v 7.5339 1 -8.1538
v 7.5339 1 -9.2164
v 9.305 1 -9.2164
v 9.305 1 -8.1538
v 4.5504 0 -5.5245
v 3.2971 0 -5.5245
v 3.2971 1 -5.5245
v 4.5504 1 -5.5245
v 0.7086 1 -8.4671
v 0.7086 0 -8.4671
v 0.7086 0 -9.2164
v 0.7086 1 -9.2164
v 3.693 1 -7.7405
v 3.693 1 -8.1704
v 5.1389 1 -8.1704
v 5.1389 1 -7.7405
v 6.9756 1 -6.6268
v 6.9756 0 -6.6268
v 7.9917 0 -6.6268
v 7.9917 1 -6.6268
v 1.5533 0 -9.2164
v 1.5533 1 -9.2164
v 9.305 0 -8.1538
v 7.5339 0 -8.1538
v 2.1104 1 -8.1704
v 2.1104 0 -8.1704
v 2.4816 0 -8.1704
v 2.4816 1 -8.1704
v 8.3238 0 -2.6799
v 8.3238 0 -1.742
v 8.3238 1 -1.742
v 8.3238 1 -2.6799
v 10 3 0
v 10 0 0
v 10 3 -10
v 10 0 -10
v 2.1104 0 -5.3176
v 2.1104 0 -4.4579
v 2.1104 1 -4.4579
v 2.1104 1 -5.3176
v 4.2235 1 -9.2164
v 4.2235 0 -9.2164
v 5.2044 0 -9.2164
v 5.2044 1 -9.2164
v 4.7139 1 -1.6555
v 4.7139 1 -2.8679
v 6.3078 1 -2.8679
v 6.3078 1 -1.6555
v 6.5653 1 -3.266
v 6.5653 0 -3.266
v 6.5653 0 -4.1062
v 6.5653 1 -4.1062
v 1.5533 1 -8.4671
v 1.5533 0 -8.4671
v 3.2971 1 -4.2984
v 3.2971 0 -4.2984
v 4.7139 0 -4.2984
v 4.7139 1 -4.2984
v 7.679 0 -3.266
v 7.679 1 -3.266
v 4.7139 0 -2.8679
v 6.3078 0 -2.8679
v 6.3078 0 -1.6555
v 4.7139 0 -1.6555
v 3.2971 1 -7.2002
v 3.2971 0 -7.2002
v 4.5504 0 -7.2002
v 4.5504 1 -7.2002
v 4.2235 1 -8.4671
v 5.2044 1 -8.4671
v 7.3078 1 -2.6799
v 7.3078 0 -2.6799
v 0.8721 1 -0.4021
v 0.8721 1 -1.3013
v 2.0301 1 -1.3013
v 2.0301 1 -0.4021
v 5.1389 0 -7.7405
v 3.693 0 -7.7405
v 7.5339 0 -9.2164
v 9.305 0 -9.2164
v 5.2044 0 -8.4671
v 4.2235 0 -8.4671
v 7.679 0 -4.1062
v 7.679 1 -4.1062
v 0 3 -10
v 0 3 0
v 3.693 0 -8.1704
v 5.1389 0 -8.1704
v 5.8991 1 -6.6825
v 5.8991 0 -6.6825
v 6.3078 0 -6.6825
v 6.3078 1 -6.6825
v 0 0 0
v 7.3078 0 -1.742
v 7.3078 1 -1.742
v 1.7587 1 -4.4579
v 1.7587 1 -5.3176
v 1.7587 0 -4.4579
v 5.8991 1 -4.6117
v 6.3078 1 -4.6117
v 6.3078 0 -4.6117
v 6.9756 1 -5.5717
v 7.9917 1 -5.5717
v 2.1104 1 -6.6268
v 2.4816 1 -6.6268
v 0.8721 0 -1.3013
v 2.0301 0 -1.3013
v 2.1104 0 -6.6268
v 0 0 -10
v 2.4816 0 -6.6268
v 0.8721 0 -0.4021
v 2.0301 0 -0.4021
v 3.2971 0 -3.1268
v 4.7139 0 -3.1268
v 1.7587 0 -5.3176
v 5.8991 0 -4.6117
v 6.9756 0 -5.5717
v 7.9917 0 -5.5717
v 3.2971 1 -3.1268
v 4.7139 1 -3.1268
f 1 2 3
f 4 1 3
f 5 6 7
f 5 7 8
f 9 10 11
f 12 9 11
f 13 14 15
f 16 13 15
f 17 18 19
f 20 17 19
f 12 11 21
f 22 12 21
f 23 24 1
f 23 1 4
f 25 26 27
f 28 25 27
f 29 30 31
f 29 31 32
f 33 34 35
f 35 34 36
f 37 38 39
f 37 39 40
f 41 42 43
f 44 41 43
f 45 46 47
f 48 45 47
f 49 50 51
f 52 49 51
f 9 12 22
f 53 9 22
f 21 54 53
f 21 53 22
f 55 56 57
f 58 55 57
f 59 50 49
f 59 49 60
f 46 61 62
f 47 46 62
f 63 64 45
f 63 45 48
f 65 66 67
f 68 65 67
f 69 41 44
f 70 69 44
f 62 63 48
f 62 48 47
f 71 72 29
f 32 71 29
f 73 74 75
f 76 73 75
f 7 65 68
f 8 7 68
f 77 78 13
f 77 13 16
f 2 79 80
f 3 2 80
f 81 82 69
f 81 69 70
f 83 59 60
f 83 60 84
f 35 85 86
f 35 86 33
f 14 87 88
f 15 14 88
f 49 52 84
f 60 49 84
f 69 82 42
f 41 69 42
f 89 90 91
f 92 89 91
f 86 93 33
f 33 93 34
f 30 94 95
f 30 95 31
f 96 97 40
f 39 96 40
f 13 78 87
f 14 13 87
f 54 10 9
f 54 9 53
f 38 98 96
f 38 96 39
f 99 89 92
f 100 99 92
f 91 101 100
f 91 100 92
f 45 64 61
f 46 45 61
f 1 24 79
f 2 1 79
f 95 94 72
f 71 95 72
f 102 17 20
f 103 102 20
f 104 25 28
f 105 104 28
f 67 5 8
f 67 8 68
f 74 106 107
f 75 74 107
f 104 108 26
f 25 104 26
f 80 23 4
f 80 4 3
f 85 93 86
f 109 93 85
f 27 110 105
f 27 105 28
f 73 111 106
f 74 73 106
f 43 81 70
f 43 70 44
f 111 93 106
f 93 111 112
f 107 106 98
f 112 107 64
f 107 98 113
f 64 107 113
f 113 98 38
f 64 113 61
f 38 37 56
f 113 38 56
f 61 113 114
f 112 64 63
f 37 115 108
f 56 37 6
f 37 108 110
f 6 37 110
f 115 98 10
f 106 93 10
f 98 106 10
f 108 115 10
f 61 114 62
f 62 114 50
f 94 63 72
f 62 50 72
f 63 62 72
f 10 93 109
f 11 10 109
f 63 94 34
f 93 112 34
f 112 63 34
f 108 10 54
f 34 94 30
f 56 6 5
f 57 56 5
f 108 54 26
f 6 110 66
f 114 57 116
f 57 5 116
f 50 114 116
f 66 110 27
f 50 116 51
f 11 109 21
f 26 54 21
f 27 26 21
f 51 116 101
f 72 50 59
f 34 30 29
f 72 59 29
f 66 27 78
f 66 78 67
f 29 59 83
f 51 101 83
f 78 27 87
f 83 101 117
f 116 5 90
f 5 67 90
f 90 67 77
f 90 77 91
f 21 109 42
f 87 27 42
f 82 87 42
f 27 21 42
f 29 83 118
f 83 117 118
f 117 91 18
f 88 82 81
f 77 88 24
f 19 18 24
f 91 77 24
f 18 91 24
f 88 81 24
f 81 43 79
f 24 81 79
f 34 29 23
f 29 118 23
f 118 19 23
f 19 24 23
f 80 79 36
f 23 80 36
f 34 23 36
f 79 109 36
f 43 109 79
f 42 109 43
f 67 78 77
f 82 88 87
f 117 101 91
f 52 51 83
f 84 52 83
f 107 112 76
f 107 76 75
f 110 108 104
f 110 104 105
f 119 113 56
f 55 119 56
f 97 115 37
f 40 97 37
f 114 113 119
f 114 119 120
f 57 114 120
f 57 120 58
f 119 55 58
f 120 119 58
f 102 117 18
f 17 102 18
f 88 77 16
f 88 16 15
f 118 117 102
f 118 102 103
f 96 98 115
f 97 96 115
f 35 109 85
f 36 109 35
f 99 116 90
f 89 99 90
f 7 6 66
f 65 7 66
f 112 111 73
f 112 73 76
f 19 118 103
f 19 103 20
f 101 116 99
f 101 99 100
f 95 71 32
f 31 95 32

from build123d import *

# Parameters (mm, degrees)
SKETCH_1_W          = 10
SKETCH_1_H          = 10
EXTRUDE_1_DEPTH     = 3
SKETCH_2_W          = 0.84464817
SKETCH_2_H          = 0.749284667
SKETCH_2_W_2        = 0.980881746
SKETCH_2_W_3        = 1.157985395
SKETCH_2_H_2        = 0.899141601
SKETCH_2_W_4        = 1.771036487
SKETCH_2_H_3        = 1.062621892
SKETCH_2_W_5        = 1.253348898
SKETCH_2_H_4        = 1.675672983
SKETCH_2_W_6        = 0.408700727
SKETCH_2_H_5        = 2.070750353
SKETCH_2_W_7        = 1.416829189
SKETCH_2_H_6        = 1.171608752
SKETCH_2_W_8        = 1.593932837
SKETCH_2_H_7        = 1.212478826
CUT_EXTRUDE_1_DEPTH = 1
SKETCH_3_W          = 0.351704959
SKETCH_3_H          = 0.859723233
SKETCH_3_W_2        = 0.371244123
SKETCH_3_H_2        = 1.543593986
SKETCH_3_W_3        = 1.445898165
SKETCH_3_H_3        = 0.429861616
SKETCH_3_W_4        = 1.016036548
SKETCH_3_H_4        = 1.055114877
SKETCH_3_W_5        = 1.11373237
SKETCH_3_H_5        = 0.840184069
SKETCH_3_H_6        = 0.937879891
CUT_EXTRUDE_3_DEPTH = 1


with BuildPart() as part:
    # 草图1 → 凸台-拉伸1 (new body)
    with BuildSketch(Plane(origin=(0, 0, 0), x_dir=(1, 0, 0), z_dir=(0, 1, 0))):
        with Locations((5, 5)):
            Rectangle(SKETCH_1_W, SKETCH_1_H)
    extrude(amount=EXTRUDE_1_DEPTH)

    # 草图2 → 切除-拉伸1 (cut)
    with BuildSketch(Plane(origin=(0, 0, 0), x_dir=(1, 0, 0), z_dir=(0, 1, 0))):
        with Locations((1.130966445, 8.841786839)):
            Rectangle(SKETCH_2_W, SKETCH_2_H)
        with Locations((4.713909491, 8.841786839)):
            Rectangle(SKETCH_2_W_2, SKETCH_2_H)
        with Locations((1.451115349, 0.851687615)):
            Rectangle(SKETCH_2_W_3, SKETCH_2_H_2)
        with Locations((8.419462755, 8.685118227)):
            Rectangle(SKETCH_2_W_4, SKETCH_2_H_3)
        with Locations((3.923754751, 6.362335759)):
            Rectangle(SKETCH_2_W_5, SKETCH_2_H_4)
        with Locations((6.103491964, 5.647109485)):
            Rectangle(SKETCH_2_W_6, SKETCH_2_H_5)
        with Locations((4.005494897, 3.712592708)):
            Rectangle(SKETCH_2_W_7, SKETCH_2_H_6)
        with Locations((5.51087591, 2.261705125)):
            Rectangle(SKETCH_2_W_8, SKETCH_2_H_7)
    extrude(amount=CUT_EXTRUDE_1_DEPTH, mode=Mode.SUBTRACT)

    # 草图3 → 切除-拉伸3 (cut)
    with BuildSketch(Plane(origin=(0, 0, 0), x_dir=(1, 0, 0), z_dir=(0, 1, 0))):
        with Locations((1.934516979, 4.887785167)):
            Rectangle(SKETCH_3_W, SKETCH_3_H)
        with Locations((2.29599152, 7.39856779)):
            Rectangle(SKETCH_3_W_2, SKETCH_3_H_2)
        with Locations((4.415990856, 7.955433975)):
            Rectangle(SKETCH_3_W_3, SKETCH_3_H_3)
        with Locations((7.483639664, 6.099213359)):
            Rectangle(SKETCH_3_W_4, SKETCH_3_H_4)
        with Locations((7.122165123, 3.686126557)):
            Rectangle(SKETCH_3_W_5, SKETCH_3_H_5)
        with Locations((7.815805458, 2.210919646)):
            Rectangle(SKETCH_3_W_4, SKETCH_3_H_6)
    extrude(amount=CUT_EXTRUDE_3_DEPTH, mode=Mode.SUBTRACT)


solid = part.part
